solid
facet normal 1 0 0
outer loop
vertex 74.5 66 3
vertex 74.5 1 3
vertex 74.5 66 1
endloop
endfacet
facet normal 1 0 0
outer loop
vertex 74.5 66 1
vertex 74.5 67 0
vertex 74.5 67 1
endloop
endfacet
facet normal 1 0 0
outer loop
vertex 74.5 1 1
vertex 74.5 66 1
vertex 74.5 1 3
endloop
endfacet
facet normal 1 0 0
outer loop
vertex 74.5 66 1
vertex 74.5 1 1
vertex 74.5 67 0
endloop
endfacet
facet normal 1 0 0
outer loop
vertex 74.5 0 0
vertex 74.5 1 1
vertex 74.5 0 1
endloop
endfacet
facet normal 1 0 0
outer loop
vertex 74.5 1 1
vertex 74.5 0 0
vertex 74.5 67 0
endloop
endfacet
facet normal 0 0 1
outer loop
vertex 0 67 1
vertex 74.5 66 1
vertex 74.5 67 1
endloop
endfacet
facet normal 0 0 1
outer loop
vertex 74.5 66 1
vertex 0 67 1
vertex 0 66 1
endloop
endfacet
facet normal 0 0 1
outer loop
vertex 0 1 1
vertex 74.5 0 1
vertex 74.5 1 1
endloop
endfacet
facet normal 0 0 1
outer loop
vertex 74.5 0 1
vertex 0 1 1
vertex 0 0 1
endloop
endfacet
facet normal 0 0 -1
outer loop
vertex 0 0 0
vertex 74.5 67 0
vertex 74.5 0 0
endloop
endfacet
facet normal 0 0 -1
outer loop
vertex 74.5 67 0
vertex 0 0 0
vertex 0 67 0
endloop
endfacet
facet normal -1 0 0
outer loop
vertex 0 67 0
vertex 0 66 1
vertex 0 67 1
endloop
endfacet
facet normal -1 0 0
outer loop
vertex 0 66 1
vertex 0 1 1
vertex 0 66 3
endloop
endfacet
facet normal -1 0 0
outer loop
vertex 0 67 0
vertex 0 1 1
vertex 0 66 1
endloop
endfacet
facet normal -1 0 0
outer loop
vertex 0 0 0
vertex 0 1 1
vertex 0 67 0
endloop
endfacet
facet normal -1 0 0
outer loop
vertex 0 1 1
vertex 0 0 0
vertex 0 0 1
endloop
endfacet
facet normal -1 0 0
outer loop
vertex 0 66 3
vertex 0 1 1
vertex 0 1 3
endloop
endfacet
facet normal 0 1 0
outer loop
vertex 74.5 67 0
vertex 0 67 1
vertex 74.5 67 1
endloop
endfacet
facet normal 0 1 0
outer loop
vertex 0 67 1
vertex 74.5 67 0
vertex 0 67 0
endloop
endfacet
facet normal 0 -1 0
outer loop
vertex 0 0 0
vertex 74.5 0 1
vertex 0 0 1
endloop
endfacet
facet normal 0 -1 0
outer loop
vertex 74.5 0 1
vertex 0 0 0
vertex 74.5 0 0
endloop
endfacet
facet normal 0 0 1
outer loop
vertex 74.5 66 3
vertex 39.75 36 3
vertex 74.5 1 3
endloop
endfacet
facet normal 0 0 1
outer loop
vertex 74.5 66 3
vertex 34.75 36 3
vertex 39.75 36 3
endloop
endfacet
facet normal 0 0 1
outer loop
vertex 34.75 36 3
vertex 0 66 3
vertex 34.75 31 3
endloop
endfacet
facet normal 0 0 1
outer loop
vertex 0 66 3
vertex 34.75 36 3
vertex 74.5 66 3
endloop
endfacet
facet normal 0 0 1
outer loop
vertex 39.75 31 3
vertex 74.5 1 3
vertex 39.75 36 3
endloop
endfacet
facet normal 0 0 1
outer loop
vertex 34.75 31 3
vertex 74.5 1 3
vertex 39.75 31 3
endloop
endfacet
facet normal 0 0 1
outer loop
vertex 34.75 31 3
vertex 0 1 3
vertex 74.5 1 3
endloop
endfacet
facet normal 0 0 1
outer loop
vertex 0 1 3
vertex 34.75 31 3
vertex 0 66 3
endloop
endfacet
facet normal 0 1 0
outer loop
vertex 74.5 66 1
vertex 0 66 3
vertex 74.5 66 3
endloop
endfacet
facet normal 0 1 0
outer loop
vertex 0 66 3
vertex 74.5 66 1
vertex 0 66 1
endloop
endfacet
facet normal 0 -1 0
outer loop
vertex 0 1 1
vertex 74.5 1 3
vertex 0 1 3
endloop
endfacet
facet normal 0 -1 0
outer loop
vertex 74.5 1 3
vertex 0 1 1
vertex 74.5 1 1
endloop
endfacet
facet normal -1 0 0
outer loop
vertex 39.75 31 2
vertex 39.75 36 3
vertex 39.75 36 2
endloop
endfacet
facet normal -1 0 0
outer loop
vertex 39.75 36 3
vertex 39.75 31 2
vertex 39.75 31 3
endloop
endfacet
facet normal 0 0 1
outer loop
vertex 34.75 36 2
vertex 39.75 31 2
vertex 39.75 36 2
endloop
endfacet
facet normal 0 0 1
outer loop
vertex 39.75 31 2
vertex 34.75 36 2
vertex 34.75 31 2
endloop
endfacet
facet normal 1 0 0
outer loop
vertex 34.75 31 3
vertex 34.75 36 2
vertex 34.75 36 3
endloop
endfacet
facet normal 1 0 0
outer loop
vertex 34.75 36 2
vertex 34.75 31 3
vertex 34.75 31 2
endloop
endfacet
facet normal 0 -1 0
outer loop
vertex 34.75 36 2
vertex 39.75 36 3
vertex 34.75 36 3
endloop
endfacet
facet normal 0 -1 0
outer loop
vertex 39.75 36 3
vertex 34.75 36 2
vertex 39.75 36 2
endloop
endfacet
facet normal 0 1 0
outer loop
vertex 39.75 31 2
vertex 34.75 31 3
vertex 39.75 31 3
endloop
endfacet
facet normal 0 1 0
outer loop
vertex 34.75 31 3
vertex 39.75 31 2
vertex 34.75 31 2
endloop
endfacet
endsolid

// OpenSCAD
DIM = [
	76.5, // Spielerinnenablage richtung
	69, // Links-Rechts
	29
];



difference(){

	union(){
		cube([ DIM.x-2 , DIM.y-2 , 1 ]);
		translate([ 0 , 1 , 1 ]) cube([ DIM.x-2 , DIM.y-4 , 2 ]);
	}
	
	// Symbol
	translate([ 0.5*(DIM.x-2) , 0.5*(DIM.y-2) , 2 ]) Symbol();
}

module Symbol () {
	
	Z = 2;
	translate([0,0,0.5*Z]) cube([5,5,Z],center=true);
	
}
